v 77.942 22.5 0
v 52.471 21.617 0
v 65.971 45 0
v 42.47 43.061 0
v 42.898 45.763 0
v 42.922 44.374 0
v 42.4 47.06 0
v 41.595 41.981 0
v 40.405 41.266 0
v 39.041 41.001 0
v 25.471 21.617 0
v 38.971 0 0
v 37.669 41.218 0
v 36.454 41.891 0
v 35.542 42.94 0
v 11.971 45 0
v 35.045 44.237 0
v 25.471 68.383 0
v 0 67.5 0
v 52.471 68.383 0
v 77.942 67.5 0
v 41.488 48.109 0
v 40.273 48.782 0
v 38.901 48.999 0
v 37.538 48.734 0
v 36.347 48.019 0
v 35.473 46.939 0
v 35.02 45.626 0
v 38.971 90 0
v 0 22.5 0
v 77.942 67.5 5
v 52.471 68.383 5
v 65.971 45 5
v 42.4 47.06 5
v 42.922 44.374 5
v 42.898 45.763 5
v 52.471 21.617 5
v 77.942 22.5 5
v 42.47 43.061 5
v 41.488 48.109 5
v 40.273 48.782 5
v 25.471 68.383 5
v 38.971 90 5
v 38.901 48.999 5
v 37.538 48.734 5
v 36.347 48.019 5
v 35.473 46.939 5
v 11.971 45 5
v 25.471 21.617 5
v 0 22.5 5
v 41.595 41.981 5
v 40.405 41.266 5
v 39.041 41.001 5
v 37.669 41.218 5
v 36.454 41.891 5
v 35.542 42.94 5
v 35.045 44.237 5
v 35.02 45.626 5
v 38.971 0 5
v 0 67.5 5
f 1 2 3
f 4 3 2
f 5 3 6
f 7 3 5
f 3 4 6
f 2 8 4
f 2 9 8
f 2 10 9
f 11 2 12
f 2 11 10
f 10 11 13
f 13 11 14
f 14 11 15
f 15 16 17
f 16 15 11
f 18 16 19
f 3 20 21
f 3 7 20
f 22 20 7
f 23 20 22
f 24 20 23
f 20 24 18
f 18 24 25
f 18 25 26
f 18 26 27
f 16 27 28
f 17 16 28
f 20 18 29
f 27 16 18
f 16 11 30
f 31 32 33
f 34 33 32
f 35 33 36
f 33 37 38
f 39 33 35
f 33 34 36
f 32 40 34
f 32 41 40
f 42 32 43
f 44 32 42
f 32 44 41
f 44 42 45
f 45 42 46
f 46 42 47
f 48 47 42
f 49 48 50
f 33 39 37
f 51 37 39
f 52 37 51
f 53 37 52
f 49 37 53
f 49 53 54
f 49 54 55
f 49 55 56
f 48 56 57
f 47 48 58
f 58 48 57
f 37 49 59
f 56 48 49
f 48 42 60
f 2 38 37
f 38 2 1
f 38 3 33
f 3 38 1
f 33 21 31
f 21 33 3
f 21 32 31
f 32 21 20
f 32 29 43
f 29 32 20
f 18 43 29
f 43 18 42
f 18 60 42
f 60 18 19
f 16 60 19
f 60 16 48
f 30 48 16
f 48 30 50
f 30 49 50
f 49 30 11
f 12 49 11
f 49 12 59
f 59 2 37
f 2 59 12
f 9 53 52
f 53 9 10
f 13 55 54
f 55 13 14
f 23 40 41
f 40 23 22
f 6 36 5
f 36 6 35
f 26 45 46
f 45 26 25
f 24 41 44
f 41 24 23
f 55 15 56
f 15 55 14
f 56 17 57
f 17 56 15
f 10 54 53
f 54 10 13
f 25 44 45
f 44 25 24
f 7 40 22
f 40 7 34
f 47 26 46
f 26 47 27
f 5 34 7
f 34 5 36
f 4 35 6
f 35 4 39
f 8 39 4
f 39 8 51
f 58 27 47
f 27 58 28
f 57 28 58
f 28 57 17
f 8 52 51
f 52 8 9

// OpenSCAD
$fn = 32;

// ----------------------------------------------------------------------
// Star wheel: 6-point blunt, R45
// ----------------------------------------------------------------------

// --- parameters (mm) ---
n_points = 6;             // number of points / teeth
r_out = 45;               // tip radius
r_in = 27;                // root radius
bore_r = 4;               // centre bore radius
plate_t = 5;              // plate thickness, Z (extrusion height)
bore_d = 8;               // centre bore diameter
fit_tol = 0.05;           // declared fit tolerance (prompt contract)
free_tol = 0.3;           // declared free tolerance (prompt contract)

profile = [[38.971, 90], [25.471, 68.383], [0, 67.5], [11.971, 45], [0, 22.5], [25.471, 21.617], [38.971, 0], [52.471, 21.617], [77.942, 22.5], [65.971, 45], [77.942, 67.5], [52.471, 68.383]];  // primary outline, 12 points, counter clockwise
void_1 = [[42.898, 45.763], [42.4, 47.06], [41.488, 48.109], [40.273, 48.782], [38.901, 48.999], [37.538, 48.734], [36.347, 48.019], [35.473, 46.939], [35.02, 45.626], [35.045, 44.237], [35.542, 42.94], [36.454, 41.891], [37.669, 41.218], [39.041, 41.001], [40.405, 41.266], [41.595, 41.981], [42.47, 43.061], [42.922, 44.374]];  // centre bore, 18 points

// --- the one profile operation ---
difference() {
  linear_extrude(height = plate_t) polygon(points = profile);
  translate([0, 0, -1])
    linear_extrude(height = plate_t + 2) polygon(points = void_1);
}
